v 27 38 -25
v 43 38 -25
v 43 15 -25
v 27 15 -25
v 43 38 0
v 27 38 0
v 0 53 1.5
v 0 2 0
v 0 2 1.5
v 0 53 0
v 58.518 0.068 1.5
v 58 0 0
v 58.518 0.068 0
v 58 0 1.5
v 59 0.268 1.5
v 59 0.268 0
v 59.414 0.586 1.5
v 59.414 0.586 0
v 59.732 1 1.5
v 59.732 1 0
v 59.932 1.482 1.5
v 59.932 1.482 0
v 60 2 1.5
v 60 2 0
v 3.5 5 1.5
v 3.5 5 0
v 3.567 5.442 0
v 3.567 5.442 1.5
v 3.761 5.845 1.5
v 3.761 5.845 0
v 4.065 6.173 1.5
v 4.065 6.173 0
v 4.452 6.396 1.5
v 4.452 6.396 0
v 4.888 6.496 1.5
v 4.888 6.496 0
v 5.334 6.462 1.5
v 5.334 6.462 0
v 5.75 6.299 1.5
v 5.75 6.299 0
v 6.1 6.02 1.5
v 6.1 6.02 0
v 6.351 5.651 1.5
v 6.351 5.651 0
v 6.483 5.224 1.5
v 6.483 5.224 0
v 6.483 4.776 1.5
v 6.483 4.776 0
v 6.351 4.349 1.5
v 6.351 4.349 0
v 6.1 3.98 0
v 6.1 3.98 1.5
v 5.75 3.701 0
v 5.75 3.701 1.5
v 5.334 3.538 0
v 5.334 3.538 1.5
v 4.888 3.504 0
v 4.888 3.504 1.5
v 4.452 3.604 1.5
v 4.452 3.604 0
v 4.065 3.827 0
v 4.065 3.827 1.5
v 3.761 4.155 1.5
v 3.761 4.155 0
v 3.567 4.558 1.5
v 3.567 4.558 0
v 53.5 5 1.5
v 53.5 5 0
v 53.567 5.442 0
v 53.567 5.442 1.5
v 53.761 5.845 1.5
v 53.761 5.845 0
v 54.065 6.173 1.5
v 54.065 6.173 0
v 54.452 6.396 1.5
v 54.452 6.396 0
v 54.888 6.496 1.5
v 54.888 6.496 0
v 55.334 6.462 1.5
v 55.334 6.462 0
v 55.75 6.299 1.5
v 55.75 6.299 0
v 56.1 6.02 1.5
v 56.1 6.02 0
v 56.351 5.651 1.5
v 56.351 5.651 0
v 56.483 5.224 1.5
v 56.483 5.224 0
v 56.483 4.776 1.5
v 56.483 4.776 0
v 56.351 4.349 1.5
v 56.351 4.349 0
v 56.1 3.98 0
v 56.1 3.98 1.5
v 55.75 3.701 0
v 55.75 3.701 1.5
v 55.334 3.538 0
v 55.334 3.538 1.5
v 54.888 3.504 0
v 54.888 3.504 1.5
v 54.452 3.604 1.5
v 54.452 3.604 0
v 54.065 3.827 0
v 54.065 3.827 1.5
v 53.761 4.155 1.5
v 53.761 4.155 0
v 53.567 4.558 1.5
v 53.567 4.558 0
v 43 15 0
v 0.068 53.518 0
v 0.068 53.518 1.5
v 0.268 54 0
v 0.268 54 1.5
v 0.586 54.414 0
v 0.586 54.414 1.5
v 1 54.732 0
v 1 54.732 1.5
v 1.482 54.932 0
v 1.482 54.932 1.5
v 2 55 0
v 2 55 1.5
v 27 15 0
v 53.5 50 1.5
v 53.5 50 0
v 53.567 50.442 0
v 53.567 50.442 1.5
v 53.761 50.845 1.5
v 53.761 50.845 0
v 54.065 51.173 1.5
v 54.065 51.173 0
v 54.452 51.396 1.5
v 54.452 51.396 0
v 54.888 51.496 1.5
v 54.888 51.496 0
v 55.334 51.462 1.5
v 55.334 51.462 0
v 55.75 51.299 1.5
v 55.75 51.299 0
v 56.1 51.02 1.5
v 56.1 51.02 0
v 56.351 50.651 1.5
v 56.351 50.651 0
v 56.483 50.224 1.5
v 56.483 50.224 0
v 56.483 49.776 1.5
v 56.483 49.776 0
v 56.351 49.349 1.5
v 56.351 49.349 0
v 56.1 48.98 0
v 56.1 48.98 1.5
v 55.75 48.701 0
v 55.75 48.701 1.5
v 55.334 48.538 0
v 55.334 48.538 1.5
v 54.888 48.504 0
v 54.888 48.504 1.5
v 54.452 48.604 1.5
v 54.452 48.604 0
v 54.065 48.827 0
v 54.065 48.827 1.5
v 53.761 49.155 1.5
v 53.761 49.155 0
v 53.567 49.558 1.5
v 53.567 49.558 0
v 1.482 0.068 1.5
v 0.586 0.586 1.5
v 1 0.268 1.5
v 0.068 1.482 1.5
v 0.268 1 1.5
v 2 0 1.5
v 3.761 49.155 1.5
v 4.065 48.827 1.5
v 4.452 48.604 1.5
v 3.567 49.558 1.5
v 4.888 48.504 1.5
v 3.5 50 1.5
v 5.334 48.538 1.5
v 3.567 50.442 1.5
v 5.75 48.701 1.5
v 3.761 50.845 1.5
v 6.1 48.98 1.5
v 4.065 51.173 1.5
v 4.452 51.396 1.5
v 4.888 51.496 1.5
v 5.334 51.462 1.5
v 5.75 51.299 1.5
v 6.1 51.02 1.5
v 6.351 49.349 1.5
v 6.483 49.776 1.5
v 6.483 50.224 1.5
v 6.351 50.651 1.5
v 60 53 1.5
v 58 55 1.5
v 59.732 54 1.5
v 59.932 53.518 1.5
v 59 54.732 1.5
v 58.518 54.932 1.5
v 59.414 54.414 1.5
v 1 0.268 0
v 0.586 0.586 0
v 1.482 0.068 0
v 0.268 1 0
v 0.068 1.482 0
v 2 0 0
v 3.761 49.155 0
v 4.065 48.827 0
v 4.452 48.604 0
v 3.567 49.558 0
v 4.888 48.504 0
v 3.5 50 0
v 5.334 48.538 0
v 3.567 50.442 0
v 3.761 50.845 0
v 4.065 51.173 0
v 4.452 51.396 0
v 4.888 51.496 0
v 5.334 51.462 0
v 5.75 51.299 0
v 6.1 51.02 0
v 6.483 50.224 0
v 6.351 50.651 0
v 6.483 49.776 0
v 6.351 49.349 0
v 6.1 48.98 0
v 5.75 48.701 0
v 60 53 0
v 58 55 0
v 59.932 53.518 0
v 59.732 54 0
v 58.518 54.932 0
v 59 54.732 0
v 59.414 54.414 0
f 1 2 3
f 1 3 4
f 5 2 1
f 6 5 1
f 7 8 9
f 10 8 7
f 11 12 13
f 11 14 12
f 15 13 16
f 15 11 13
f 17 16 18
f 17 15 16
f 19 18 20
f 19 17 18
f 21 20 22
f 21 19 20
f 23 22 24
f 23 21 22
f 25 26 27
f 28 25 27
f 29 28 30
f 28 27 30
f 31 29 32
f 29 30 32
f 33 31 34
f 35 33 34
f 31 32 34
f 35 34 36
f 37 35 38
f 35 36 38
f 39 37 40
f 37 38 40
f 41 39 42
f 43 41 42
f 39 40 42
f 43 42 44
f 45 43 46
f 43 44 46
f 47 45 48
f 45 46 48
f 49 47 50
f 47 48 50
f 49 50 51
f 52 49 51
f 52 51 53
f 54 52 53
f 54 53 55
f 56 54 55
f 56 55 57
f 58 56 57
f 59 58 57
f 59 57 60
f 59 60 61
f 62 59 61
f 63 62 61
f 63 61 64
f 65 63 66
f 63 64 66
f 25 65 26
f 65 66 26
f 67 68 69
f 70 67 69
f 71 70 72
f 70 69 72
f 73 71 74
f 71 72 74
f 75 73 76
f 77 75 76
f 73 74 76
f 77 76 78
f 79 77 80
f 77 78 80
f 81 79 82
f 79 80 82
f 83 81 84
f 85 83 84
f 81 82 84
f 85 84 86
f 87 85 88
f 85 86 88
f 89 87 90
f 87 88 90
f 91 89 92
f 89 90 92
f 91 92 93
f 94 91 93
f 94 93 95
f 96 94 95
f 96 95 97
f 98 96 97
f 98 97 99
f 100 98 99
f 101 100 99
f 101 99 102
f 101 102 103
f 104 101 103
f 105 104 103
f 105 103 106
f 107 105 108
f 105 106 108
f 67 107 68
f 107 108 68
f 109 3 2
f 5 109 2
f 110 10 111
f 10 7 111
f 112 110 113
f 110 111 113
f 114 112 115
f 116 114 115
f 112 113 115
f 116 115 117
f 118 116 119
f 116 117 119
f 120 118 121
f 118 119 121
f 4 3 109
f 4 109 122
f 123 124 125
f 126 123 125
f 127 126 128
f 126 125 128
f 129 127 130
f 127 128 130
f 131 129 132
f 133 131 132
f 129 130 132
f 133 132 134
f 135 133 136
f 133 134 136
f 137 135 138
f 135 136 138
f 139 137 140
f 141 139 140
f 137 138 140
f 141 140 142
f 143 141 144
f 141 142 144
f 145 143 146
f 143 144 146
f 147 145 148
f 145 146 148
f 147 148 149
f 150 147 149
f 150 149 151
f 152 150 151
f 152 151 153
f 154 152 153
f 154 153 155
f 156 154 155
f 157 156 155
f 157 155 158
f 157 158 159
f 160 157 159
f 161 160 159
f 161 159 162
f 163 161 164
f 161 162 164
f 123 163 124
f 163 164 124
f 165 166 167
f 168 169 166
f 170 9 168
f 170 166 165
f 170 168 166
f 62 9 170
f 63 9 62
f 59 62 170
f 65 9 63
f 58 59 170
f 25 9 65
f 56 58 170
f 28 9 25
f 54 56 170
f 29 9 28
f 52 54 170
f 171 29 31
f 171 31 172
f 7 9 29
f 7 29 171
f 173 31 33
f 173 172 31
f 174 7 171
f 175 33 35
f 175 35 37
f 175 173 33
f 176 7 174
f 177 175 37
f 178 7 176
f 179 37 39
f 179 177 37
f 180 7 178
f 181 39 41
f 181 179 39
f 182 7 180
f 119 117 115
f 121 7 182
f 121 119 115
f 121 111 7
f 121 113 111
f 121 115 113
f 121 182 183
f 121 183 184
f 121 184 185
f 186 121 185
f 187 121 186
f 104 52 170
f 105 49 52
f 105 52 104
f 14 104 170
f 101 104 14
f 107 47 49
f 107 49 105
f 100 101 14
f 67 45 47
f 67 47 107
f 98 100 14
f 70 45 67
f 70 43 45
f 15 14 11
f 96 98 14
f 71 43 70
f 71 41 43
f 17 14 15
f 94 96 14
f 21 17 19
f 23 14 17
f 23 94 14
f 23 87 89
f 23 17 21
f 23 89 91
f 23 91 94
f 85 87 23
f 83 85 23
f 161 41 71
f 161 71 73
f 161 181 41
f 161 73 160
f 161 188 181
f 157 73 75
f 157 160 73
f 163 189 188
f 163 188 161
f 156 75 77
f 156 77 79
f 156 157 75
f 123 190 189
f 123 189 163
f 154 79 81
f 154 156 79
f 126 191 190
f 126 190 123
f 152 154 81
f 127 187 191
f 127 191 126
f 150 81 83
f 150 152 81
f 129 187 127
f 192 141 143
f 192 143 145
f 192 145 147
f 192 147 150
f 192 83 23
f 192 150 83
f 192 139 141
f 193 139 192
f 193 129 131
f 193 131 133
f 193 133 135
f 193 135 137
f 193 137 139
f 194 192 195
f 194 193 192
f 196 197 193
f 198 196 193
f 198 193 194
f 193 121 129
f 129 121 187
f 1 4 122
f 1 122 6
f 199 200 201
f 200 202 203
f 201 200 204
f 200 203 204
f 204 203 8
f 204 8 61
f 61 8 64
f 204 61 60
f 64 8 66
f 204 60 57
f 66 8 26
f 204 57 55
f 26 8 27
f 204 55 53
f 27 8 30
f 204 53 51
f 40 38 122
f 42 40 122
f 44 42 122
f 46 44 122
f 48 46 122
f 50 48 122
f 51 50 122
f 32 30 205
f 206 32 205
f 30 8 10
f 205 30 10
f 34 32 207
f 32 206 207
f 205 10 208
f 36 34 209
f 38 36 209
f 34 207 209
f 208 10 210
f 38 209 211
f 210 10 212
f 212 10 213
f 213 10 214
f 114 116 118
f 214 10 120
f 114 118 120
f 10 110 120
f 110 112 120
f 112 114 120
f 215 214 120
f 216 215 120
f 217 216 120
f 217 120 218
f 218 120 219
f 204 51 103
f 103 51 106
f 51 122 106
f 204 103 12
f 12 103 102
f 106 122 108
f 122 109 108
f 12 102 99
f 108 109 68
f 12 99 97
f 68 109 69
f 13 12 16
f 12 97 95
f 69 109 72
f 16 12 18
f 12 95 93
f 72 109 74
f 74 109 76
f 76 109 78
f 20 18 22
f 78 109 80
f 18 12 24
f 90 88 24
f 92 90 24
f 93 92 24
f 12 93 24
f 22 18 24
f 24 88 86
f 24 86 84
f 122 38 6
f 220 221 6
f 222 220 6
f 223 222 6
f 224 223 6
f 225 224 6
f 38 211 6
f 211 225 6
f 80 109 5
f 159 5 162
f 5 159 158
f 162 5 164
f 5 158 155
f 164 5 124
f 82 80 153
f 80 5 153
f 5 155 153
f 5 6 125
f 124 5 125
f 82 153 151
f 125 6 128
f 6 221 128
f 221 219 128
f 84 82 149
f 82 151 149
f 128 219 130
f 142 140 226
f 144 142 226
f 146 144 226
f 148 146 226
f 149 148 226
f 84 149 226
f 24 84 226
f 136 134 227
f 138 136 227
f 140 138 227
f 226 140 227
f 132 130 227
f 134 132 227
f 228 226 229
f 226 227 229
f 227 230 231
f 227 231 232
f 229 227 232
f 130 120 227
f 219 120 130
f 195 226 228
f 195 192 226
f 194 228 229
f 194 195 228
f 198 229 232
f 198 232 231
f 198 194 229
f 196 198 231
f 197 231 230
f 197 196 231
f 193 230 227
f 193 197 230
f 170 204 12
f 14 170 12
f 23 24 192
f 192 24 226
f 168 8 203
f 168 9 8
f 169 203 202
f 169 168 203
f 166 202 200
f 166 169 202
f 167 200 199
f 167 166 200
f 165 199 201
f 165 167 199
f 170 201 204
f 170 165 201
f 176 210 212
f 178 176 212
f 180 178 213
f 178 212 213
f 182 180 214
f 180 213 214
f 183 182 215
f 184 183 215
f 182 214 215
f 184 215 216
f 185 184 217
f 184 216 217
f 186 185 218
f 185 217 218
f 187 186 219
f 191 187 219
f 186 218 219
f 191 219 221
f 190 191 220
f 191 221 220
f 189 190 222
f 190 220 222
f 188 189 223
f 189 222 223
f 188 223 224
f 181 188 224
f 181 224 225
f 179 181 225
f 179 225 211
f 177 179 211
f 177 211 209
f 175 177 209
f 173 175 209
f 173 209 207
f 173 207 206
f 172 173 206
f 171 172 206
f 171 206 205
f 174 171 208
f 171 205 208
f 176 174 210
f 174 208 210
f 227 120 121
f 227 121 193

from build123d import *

# Parameters (mm, degrees)
ESQUISSE1_W             = 60
ESQUISSE1_H             = 55
BOSS_EXTRU_1_DEPTH      = 1.5
CONG_1_R                = 2
ESQUISSE2_R             = 1.5
ENL_V_MAT_EXTRU_1_DEPTH = 1.5
ESQUISSE3_W             = 16
ESQUISSE3_H             = 23
BOSS_EXTRU_2_DEPTH      = 25


with BuildPart() as part:
    # Esquisse1 → Boss.-Extru.1 (new body)
    with BuildSketch(Plane.XY):
        with Locations((30, 27.5)):
            Rectangle(ESQUISSE1_W, ESQUISSE1_H)
    extrude(amount=BOSS_EXTRU_1_DEPTH)

    # Congé1
    cong_1_edges = [part.edges().sort_by_distance(p)[0] for p in [
        (0, 55, 0.75),
        (60, 55, 0.75),
        (60, 0, 0.75),
        (0, 0, 0.75),
    ]]
    fillet(cong_1_edges, radius=CONG_1_R)

    # Esquisse2 → Enlèv. mat.-Extru.1 (cut)
    with BuildSketch(Plane(origin=(0, 0, 0), x_dir=(-1, 0, 0), z_dir=(0, 0, -1))):
        with Locations((-5, 5)):
            Circle(ESQUISSE2_R)
        with Locations((-5, 50)):
            Circle(ESQUISSE2_R)
        with Locations((-55, 50)):
            Circle(ESQUISSE2_R)
        with Locations((-55, 5)):
            Circle(ESQUISSE2_R)
    extrude(amount=-ENL_V_MAT_EXTRU_1_DEPTH, mode=Mode.SUBTRACT)

    # Esquisse3 → Boss.-Extru.2 (add)
    with BuildSketch(Plane(origin=(0, 0, 0), x_dir=(-1, 0, 0), z_dir=(0, 0, -1))):
        with Locations((-35, 26.5)):
            Rectangle(ESQUISSE3_W, ESQUISSE3_H)
    extrude(amount=BOSS_EXTRU_2_DEPTH)


solid = part.part
